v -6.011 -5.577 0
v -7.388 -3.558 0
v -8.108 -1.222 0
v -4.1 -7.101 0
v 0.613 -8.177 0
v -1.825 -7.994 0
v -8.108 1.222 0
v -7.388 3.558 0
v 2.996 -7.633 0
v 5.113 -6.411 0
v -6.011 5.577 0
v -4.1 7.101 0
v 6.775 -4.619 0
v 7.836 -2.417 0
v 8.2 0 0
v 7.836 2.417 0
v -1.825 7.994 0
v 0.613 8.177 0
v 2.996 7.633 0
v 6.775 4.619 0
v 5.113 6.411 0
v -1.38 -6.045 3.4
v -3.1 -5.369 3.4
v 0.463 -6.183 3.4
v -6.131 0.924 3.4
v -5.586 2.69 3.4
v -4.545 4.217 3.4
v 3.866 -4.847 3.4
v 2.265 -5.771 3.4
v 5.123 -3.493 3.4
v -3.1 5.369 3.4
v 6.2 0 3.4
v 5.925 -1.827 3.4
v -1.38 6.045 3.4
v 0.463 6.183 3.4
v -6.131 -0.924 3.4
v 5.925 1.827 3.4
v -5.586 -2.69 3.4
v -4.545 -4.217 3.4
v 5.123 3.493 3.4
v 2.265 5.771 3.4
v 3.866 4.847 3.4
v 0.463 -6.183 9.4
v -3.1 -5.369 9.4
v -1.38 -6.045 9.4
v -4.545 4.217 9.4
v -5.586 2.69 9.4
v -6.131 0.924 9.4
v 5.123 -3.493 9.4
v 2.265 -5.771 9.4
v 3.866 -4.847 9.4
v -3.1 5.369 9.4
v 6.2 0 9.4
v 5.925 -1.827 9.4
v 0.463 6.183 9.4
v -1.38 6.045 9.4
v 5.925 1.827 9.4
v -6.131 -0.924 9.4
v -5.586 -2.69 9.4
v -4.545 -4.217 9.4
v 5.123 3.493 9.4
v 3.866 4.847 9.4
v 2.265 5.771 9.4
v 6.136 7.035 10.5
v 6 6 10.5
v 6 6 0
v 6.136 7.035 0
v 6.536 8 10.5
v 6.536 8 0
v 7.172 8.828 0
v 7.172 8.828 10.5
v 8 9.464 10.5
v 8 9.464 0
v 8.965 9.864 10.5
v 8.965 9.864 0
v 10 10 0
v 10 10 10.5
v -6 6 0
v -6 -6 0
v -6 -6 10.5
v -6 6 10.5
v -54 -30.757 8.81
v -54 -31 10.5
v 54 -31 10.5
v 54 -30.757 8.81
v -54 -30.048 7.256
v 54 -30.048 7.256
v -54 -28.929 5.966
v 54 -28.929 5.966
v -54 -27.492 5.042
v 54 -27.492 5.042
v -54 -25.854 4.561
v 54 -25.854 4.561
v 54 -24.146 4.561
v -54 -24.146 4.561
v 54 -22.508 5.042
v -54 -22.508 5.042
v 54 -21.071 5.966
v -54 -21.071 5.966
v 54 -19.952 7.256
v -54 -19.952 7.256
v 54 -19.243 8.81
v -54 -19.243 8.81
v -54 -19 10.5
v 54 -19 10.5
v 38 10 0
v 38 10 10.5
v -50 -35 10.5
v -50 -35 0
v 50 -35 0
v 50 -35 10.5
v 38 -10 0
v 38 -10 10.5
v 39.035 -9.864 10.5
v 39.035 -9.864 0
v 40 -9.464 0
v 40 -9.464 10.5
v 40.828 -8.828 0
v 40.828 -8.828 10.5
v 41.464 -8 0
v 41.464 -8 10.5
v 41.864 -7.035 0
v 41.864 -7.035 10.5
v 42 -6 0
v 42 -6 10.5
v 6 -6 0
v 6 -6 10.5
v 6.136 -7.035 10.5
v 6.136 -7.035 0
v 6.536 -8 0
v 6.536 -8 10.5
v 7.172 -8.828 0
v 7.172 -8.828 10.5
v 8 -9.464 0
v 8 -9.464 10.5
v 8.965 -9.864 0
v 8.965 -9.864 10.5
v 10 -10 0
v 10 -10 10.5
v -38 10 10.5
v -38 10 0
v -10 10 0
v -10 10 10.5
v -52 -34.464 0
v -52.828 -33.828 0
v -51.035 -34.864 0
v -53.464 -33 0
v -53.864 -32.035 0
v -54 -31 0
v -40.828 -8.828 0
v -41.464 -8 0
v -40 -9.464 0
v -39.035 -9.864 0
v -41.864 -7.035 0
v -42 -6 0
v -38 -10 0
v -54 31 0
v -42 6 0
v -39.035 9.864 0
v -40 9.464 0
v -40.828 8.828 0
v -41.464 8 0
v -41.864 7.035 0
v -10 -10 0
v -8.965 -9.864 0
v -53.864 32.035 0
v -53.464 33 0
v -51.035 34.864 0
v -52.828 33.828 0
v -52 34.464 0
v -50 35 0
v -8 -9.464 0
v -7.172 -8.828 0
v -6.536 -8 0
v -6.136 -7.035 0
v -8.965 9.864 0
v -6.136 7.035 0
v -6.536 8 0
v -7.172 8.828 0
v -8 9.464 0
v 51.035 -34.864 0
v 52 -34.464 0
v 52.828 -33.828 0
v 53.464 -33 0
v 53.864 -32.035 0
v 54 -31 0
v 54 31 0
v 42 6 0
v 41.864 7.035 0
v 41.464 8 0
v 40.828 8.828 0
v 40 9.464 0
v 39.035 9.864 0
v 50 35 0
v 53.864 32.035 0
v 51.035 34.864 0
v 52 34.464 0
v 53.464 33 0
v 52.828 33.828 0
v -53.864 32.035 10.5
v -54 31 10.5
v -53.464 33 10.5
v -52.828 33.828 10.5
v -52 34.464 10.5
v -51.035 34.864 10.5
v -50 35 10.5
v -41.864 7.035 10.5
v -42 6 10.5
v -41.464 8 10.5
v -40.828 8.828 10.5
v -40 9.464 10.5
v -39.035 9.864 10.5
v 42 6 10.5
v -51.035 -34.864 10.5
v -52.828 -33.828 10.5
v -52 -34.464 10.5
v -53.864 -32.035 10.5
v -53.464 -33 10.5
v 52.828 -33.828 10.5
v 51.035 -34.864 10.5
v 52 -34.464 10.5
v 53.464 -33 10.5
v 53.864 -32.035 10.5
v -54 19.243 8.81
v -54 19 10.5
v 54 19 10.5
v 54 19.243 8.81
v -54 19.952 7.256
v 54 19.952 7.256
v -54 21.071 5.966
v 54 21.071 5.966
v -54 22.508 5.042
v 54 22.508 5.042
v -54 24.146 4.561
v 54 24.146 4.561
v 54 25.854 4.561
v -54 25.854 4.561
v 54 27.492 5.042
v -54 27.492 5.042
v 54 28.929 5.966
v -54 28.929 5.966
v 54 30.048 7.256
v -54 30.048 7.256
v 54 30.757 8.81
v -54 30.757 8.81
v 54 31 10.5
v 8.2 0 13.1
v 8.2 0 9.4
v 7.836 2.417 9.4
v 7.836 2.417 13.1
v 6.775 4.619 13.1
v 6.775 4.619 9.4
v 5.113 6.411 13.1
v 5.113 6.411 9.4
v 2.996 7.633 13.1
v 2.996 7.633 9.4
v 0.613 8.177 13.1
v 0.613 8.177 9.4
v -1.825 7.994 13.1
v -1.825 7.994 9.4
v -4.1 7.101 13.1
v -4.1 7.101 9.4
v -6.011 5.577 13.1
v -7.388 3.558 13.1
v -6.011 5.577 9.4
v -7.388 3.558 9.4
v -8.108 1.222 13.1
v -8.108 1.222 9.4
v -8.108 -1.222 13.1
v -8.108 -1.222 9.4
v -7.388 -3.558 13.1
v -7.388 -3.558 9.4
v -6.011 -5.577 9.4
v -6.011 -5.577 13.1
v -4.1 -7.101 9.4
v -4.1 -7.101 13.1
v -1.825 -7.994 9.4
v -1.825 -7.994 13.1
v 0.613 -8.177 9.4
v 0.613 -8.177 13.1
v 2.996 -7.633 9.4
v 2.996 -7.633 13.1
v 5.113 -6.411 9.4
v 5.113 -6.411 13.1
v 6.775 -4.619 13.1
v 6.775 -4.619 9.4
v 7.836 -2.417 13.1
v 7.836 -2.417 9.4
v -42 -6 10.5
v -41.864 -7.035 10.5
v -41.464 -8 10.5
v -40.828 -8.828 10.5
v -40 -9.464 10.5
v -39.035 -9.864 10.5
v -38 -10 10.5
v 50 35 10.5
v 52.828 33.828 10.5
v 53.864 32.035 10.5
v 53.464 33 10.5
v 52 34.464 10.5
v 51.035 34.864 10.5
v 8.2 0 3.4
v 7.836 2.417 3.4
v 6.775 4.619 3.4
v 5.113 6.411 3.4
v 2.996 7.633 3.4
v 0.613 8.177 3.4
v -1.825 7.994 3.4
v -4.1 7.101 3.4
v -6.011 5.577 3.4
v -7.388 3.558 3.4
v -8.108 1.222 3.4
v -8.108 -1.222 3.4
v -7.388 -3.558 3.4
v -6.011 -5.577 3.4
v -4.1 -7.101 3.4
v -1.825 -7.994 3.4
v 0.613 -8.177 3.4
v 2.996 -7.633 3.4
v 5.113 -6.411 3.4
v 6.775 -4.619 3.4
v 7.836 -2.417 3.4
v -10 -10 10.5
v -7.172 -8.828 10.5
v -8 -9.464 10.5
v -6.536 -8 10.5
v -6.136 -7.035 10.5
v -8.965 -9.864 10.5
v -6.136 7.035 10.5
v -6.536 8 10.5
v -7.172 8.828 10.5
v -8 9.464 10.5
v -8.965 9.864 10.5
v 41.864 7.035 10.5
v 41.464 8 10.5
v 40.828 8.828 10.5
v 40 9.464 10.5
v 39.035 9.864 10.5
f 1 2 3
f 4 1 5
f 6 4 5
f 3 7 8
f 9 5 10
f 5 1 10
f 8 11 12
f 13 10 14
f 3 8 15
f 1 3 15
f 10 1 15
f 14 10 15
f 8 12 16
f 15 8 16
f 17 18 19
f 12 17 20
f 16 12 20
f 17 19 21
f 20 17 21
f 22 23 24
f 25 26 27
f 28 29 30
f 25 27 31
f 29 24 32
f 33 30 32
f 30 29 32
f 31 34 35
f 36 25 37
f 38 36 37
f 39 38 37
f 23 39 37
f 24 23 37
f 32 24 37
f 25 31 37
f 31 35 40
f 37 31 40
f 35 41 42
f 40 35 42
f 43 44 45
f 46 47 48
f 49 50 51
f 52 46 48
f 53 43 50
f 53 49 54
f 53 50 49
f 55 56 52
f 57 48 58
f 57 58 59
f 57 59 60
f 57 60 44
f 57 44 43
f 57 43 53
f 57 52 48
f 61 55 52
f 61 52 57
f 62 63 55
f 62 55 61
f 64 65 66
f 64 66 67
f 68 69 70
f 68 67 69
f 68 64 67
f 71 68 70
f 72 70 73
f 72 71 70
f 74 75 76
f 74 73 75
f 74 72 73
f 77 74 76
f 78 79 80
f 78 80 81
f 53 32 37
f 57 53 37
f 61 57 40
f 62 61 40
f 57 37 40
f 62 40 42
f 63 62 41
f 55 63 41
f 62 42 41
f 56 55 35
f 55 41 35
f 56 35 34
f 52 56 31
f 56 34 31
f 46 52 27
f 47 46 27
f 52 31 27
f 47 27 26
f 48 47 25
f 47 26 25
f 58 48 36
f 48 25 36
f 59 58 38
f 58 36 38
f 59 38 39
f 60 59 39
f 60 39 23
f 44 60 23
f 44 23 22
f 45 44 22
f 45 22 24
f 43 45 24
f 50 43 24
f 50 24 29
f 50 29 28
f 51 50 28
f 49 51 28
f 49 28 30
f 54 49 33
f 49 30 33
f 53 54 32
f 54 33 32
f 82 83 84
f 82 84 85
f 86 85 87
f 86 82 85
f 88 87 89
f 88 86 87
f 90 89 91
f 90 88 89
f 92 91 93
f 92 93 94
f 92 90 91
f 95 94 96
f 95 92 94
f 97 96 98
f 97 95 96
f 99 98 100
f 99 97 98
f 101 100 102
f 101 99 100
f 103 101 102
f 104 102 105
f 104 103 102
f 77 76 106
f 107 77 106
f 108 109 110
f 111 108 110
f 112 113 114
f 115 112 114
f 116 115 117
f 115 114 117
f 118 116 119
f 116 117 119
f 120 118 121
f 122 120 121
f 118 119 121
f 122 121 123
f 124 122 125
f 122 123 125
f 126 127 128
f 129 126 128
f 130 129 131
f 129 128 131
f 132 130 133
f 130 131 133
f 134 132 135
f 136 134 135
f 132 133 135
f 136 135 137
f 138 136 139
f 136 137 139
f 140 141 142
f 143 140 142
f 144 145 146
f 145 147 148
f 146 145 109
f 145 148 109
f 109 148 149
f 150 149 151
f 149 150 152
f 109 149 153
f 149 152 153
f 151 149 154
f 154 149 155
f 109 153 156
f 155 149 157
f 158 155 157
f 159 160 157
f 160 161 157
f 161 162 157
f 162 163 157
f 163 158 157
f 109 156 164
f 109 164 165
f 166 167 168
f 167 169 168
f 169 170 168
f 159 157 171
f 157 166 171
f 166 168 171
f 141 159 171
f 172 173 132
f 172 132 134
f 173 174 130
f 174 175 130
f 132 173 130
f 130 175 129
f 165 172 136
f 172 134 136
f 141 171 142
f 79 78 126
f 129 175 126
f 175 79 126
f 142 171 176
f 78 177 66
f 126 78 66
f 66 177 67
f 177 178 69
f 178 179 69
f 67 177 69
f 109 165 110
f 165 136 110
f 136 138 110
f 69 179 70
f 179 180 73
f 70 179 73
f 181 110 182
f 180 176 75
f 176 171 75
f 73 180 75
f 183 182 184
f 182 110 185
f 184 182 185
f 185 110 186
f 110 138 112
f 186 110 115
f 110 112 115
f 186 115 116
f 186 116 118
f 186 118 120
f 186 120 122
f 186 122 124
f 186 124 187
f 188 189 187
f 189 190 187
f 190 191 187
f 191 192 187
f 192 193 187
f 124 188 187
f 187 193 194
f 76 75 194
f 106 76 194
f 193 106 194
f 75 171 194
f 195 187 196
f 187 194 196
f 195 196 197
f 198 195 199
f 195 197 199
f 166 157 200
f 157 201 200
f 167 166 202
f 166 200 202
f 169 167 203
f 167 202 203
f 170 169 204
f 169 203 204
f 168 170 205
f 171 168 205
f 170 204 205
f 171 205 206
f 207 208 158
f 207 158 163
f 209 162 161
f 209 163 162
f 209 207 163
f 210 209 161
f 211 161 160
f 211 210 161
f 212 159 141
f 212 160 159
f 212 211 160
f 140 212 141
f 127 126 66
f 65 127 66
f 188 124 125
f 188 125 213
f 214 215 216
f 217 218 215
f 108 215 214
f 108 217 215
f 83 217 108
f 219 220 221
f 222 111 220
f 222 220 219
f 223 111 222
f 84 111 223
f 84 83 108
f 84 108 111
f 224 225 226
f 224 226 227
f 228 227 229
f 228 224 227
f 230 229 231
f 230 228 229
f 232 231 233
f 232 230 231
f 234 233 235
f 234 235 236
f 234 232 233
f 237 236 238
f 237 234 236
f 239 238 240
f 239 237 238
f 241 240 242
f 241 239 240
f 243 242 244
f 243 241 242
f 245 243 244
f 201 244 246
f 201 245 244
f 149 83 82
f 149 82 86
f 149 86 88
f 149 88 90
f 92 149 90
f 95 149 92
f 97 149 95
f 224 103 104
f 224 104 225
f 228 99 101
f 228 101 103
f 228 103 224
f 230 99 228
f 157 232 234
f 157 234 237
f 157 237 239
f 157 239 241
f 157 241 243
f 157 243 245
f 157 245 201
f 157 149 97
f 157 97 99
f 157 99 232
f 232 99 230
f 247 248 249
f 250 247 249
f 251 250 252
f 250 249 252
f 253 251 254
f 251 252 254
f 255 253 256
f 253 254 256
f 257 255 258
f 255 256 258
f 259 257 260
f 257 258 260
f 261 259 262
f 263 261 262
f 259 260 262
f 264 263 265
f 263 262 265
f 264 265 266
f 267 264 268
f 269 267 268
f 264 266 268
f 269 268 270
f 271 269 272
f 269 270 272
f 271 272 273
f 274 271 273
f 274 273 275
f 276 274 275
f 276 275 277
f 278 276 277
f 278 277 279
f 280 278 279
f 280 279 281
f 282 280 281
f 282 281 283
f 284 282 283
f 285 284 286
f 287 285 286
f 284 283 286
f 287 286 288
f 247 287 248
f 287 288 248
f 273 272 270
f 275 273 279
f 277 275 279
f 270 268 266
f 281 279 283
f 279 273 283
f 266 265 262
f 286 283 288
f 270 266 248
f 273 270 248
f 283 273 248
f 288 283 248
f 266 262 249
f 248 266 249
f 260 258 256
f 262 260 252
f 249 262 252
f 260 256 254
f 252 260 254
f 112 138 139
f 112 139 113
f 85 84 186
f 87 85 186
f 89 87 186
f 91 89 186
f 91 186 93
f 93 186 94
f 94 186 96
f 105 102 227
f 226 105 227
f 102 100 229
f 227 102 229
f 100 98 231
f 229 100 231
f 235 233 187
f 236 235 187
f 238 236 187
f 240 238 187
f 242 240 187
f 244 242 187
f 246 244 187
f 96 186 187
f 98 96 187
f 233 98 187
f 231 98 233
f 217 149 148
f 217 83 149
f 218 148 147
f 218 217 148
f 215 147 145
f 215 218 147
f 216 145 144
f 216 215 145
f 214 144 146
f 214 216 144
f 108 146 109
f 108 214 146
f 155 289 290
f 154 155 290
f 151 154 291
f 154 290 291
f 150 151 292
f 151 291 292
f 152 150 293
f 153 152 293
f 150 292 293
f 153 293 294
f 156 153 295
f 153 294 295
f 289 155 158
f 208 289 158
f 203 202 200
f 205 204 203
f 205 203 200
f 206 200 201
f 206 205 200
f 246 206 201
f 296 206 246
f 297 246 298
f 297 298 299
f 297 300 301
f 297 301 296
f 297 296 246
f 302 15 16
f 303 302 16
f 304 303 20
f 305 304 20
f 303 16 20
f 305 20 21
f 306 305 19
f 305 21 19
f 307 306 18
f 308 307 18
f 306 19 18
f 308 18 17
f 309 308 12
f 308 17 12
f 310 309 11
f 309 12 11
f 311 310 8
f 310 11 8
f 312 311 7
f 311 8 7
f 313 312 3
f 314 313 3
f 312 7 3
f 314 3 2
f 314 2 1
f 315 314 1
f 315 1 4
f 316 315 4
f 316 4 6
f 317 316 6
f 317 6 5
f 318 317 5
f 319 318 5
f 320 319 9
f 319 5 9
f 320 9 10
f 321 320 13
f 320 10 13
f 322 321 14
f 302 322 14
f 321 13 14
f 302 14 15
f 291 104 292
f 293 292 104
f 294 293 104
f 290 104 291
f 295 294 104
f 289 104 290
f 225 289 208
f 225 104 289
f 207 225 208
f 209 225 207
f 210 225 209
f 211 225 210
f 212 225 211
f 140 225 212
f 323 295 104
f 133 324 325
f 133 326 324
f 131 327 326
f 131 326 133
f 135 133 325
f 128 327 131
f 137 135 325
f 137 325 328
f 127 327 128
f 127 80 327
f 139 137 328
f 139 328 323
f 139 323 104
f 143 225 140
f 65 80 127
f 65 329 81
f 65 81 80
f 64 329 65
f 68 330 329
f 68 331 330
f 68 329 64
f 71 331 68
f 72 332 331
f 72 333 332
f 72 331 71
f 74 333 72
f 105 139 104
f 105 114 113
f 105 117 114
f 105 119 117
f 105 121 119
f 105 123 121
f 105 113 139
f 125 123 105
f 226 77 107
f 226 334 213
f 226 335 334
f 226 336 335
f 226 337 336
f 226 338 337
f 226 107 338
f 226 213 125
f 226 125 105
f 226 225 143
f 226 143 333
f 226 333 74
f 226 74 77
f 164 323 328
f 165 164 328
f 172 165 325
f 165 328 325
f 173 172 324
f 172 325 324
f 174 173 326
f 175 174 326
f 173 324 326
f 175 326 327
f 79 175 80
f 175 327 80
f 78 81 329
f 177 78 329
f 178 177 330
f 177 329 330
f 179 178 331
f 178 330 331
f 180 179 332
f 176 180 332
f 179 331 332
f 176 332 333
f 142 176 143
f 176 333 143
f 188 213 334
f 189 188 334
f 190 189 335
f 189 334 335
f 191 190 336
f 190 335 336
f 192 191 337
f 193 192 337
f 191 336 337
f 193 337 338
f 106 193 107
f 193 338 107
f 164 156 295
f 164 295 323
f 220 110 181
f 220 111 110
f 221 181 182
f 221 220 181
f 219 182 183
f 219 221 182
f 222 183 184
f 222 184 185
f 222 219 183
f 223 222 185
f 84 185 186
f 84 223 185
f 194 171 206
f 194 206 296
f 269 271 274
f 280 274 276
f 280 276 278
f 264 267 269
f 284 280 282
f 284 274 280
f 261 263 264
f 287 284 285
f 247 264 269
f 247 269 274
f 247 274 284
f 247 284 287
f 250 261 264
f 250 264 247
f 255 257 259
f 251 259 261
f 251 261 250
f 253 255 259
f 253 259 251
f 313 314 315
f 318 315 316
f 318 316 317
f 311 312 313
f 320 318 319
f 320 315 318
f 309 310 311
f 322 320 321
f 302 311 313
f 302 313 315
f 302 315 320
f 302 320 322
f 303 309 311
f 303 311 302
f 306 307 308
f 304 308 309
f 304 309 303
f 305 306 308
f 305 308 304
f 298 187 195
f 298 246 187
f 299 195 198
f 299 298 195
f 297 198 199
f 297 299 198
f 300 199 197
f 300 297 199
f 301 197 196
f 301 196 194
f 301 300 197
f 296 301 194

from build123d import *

# Parameters (mm, degrees)
EXTR_OUTUP_R      = 8.2
EXTR_OUTUP_DEPTH  = 3.7
EXTR_IN_R         = 6.2
EXTR_IN_DEPTH     = 6
EXTR_OUTBOT_R     = 8.2
EXTR_OUTBOT_DEPTH = 3.4
INRECT_N_W        = 36
INRECT_N_H        = 20
INRECT_N_DEPTH    = 12.5
INRECT_N_FLLT_R   = 4
ROD_N_R           = 6
ROD_N_DEPTH       = 110
ROD_N_PITCH_ANGLE = 90
ROD_P_R           = 6
ROD_P_DEPTH       = 110
ROD_P_PITCH_ANGLE = 90
INRECT_P_W        = 36
INRECT_P_H        = 20
INRECT_P_DEPTH    = 12.5
INRECT_P_FLLT_R   = 4
TOTAL_BOX_W       = 108
TOTAL_BOX_H       = 70
TOTAL_BOX_DEPTH   = 10.5
TOT_BOX_FLLT_R    = 4


with BuildPart() as extr_outup:
    # extr_outup → extr_outup (new body)
    with BuildSketch(Plane.XY.offset(9.4)):
        Circle(EXTR_OUTUP_R)
    extrude(amount=EXTR_OUTUP_DEPTH)


with BuildPart() as extr_in:
    # extr_in → extr_in (new body)
    with BuildSketch(Plane.XY.offset(3.4)):
        Circle(EXTR_IN_R)
    extrude(amount=EXTR_IN_DEPTH)


with BuildPart() as extr_outbot:
    # extr_outbot → extr_outbot (new body)
    with BuildSketch(Plane.XY):
        Circle(EXTR_OUTBOT_R)
    extrude(amount=EXTR_OUTBOT_DEPTH)


with BuildPart() as inrect_n_fllt:
    # inrect_n → inrect_n (new body)
    with BuildSketch(Plane(origin=(-42, -10, -1), x_dir=(1, 0, 0), z_dir=(0, 0, 1))):
        with Locations((18, 10)):
            Rectangle(INRECT_N_W, INRECT_N_H)
    extrude(amount=INRECT_N_DEPTH)

    # inrect_n_fllt
    inrect_n_fllt_edges = [inrect_n_fllt.edges().sort_by_distance(p)[0] for p in [
        (-42, -10, 5.25),
        (-42, 10, 5.25),
        (-6, -10, 5.25),
        (-6, 10, 5.25),
    ]]
    fillet(inrect_n_fllt_edges, radius=INRECT_N_FLLT_R)


with BuildPart() as rod_n:
    # rod_n → rod_n (new body)
    with BuildSketch(Plane.XY):
        Circle(ROD_N_R)
    extrude(amount=ROD_N_DEPTH)


with BuildPart() as rod_n_1:
    # rod_n pitch: moved
    add(rod_n.part.rotate(Axis((0, 0, 0), (0, 1, 0)), ROD_N_PITCH_ANGLE))


with BuildPart() as rod_n_2:
    # rod_n placement: moved
    add(rod_n_1.part.moved(Location((-55, -25, 10.5))))


with BuildPart() as rod_p:
    # rod_p → rod_p (new body)
    with BuildSketch(Plane.XY):
        Circle(ROD_P_R)
    extrude(amount=ROD_P_DEPTH)


with BuildPart() as rod_p_1:
    # rod_p pitch: moved
    add(rod_p.part.rotate(Axis((0, 0, 0), (0, 1, 0)), ROD_P_PITCH_ANGLE))


with BuildPart() as rod_p_2:
    # rod_p placement: moved
    add(rod_p_1.part.moved(Location((-55, 25, 10.5))))


with BuildPart() as fuse_holes:
    # inrect_p → inrect_p (new body)
    with BuildSketch(Plane(origin=(6, -10, -1), x_dir=(1, 0, 0), z_dir=(0, 0, 1))):
        with Locations((18, 10)):
            Rectangle(INRECT_P_W, INRECT_P_H)
    extrude(amount=INRECT_P_DEPTH)

    # inrect_p_fllt
    inrect_p_fllt_edges = [fuse_holes.edges().sort_by_distance(p)[0] for p in [
        (6, -10, 5.25),
        (6, 10, 5.25),
        (42, -10, 5.25),
        (42, 10, 5.25),
    ]]
    fillet(inrect_p_fllt_edges, radius=INRECT_P_FLLT_R)

    # fuse_holes: union inrect_n_fllt, rod_n, rod_p
    add(inrect_n_fllt.part)
    add(rod_n_2.part)
    add(rod_p_2.part)


with BuildPart() as carr_hole:
    # total_box → total_box (new body)
    with BuildSketch(Plane(origin=(-54, -35, 0), x_dir=(1, 0, 0), z_dir=(0, 0, 1))):
        with Locations((54, 35)):
            Rectangle(TOTAL_BOX_W, TOTAL_BOX_H)
    extrude(amount=TOTAL_BOX_DEPTH)

    # tot_box_fllt
    tot_box_fllt_edges = [carr_hole.edges().sort_by_distance(p)[0] for p in [
        (-54, -35, 5.25),
        (-54, 35, 5.25),
        (54, -35, 5.25),
        (54, 35, 5.25),
    ]]
    fillet(tot_box_fllt_edges, radius=TOT_BOX_FLLT_R)

    # carr_hole: cut fuse_holes
    add(fuse_holes.part, mode=Mode.SUBTRACT)


solid = Compound([extr_outup.part, extr_in.part, extr_outbot.part, carr_hole.part])
